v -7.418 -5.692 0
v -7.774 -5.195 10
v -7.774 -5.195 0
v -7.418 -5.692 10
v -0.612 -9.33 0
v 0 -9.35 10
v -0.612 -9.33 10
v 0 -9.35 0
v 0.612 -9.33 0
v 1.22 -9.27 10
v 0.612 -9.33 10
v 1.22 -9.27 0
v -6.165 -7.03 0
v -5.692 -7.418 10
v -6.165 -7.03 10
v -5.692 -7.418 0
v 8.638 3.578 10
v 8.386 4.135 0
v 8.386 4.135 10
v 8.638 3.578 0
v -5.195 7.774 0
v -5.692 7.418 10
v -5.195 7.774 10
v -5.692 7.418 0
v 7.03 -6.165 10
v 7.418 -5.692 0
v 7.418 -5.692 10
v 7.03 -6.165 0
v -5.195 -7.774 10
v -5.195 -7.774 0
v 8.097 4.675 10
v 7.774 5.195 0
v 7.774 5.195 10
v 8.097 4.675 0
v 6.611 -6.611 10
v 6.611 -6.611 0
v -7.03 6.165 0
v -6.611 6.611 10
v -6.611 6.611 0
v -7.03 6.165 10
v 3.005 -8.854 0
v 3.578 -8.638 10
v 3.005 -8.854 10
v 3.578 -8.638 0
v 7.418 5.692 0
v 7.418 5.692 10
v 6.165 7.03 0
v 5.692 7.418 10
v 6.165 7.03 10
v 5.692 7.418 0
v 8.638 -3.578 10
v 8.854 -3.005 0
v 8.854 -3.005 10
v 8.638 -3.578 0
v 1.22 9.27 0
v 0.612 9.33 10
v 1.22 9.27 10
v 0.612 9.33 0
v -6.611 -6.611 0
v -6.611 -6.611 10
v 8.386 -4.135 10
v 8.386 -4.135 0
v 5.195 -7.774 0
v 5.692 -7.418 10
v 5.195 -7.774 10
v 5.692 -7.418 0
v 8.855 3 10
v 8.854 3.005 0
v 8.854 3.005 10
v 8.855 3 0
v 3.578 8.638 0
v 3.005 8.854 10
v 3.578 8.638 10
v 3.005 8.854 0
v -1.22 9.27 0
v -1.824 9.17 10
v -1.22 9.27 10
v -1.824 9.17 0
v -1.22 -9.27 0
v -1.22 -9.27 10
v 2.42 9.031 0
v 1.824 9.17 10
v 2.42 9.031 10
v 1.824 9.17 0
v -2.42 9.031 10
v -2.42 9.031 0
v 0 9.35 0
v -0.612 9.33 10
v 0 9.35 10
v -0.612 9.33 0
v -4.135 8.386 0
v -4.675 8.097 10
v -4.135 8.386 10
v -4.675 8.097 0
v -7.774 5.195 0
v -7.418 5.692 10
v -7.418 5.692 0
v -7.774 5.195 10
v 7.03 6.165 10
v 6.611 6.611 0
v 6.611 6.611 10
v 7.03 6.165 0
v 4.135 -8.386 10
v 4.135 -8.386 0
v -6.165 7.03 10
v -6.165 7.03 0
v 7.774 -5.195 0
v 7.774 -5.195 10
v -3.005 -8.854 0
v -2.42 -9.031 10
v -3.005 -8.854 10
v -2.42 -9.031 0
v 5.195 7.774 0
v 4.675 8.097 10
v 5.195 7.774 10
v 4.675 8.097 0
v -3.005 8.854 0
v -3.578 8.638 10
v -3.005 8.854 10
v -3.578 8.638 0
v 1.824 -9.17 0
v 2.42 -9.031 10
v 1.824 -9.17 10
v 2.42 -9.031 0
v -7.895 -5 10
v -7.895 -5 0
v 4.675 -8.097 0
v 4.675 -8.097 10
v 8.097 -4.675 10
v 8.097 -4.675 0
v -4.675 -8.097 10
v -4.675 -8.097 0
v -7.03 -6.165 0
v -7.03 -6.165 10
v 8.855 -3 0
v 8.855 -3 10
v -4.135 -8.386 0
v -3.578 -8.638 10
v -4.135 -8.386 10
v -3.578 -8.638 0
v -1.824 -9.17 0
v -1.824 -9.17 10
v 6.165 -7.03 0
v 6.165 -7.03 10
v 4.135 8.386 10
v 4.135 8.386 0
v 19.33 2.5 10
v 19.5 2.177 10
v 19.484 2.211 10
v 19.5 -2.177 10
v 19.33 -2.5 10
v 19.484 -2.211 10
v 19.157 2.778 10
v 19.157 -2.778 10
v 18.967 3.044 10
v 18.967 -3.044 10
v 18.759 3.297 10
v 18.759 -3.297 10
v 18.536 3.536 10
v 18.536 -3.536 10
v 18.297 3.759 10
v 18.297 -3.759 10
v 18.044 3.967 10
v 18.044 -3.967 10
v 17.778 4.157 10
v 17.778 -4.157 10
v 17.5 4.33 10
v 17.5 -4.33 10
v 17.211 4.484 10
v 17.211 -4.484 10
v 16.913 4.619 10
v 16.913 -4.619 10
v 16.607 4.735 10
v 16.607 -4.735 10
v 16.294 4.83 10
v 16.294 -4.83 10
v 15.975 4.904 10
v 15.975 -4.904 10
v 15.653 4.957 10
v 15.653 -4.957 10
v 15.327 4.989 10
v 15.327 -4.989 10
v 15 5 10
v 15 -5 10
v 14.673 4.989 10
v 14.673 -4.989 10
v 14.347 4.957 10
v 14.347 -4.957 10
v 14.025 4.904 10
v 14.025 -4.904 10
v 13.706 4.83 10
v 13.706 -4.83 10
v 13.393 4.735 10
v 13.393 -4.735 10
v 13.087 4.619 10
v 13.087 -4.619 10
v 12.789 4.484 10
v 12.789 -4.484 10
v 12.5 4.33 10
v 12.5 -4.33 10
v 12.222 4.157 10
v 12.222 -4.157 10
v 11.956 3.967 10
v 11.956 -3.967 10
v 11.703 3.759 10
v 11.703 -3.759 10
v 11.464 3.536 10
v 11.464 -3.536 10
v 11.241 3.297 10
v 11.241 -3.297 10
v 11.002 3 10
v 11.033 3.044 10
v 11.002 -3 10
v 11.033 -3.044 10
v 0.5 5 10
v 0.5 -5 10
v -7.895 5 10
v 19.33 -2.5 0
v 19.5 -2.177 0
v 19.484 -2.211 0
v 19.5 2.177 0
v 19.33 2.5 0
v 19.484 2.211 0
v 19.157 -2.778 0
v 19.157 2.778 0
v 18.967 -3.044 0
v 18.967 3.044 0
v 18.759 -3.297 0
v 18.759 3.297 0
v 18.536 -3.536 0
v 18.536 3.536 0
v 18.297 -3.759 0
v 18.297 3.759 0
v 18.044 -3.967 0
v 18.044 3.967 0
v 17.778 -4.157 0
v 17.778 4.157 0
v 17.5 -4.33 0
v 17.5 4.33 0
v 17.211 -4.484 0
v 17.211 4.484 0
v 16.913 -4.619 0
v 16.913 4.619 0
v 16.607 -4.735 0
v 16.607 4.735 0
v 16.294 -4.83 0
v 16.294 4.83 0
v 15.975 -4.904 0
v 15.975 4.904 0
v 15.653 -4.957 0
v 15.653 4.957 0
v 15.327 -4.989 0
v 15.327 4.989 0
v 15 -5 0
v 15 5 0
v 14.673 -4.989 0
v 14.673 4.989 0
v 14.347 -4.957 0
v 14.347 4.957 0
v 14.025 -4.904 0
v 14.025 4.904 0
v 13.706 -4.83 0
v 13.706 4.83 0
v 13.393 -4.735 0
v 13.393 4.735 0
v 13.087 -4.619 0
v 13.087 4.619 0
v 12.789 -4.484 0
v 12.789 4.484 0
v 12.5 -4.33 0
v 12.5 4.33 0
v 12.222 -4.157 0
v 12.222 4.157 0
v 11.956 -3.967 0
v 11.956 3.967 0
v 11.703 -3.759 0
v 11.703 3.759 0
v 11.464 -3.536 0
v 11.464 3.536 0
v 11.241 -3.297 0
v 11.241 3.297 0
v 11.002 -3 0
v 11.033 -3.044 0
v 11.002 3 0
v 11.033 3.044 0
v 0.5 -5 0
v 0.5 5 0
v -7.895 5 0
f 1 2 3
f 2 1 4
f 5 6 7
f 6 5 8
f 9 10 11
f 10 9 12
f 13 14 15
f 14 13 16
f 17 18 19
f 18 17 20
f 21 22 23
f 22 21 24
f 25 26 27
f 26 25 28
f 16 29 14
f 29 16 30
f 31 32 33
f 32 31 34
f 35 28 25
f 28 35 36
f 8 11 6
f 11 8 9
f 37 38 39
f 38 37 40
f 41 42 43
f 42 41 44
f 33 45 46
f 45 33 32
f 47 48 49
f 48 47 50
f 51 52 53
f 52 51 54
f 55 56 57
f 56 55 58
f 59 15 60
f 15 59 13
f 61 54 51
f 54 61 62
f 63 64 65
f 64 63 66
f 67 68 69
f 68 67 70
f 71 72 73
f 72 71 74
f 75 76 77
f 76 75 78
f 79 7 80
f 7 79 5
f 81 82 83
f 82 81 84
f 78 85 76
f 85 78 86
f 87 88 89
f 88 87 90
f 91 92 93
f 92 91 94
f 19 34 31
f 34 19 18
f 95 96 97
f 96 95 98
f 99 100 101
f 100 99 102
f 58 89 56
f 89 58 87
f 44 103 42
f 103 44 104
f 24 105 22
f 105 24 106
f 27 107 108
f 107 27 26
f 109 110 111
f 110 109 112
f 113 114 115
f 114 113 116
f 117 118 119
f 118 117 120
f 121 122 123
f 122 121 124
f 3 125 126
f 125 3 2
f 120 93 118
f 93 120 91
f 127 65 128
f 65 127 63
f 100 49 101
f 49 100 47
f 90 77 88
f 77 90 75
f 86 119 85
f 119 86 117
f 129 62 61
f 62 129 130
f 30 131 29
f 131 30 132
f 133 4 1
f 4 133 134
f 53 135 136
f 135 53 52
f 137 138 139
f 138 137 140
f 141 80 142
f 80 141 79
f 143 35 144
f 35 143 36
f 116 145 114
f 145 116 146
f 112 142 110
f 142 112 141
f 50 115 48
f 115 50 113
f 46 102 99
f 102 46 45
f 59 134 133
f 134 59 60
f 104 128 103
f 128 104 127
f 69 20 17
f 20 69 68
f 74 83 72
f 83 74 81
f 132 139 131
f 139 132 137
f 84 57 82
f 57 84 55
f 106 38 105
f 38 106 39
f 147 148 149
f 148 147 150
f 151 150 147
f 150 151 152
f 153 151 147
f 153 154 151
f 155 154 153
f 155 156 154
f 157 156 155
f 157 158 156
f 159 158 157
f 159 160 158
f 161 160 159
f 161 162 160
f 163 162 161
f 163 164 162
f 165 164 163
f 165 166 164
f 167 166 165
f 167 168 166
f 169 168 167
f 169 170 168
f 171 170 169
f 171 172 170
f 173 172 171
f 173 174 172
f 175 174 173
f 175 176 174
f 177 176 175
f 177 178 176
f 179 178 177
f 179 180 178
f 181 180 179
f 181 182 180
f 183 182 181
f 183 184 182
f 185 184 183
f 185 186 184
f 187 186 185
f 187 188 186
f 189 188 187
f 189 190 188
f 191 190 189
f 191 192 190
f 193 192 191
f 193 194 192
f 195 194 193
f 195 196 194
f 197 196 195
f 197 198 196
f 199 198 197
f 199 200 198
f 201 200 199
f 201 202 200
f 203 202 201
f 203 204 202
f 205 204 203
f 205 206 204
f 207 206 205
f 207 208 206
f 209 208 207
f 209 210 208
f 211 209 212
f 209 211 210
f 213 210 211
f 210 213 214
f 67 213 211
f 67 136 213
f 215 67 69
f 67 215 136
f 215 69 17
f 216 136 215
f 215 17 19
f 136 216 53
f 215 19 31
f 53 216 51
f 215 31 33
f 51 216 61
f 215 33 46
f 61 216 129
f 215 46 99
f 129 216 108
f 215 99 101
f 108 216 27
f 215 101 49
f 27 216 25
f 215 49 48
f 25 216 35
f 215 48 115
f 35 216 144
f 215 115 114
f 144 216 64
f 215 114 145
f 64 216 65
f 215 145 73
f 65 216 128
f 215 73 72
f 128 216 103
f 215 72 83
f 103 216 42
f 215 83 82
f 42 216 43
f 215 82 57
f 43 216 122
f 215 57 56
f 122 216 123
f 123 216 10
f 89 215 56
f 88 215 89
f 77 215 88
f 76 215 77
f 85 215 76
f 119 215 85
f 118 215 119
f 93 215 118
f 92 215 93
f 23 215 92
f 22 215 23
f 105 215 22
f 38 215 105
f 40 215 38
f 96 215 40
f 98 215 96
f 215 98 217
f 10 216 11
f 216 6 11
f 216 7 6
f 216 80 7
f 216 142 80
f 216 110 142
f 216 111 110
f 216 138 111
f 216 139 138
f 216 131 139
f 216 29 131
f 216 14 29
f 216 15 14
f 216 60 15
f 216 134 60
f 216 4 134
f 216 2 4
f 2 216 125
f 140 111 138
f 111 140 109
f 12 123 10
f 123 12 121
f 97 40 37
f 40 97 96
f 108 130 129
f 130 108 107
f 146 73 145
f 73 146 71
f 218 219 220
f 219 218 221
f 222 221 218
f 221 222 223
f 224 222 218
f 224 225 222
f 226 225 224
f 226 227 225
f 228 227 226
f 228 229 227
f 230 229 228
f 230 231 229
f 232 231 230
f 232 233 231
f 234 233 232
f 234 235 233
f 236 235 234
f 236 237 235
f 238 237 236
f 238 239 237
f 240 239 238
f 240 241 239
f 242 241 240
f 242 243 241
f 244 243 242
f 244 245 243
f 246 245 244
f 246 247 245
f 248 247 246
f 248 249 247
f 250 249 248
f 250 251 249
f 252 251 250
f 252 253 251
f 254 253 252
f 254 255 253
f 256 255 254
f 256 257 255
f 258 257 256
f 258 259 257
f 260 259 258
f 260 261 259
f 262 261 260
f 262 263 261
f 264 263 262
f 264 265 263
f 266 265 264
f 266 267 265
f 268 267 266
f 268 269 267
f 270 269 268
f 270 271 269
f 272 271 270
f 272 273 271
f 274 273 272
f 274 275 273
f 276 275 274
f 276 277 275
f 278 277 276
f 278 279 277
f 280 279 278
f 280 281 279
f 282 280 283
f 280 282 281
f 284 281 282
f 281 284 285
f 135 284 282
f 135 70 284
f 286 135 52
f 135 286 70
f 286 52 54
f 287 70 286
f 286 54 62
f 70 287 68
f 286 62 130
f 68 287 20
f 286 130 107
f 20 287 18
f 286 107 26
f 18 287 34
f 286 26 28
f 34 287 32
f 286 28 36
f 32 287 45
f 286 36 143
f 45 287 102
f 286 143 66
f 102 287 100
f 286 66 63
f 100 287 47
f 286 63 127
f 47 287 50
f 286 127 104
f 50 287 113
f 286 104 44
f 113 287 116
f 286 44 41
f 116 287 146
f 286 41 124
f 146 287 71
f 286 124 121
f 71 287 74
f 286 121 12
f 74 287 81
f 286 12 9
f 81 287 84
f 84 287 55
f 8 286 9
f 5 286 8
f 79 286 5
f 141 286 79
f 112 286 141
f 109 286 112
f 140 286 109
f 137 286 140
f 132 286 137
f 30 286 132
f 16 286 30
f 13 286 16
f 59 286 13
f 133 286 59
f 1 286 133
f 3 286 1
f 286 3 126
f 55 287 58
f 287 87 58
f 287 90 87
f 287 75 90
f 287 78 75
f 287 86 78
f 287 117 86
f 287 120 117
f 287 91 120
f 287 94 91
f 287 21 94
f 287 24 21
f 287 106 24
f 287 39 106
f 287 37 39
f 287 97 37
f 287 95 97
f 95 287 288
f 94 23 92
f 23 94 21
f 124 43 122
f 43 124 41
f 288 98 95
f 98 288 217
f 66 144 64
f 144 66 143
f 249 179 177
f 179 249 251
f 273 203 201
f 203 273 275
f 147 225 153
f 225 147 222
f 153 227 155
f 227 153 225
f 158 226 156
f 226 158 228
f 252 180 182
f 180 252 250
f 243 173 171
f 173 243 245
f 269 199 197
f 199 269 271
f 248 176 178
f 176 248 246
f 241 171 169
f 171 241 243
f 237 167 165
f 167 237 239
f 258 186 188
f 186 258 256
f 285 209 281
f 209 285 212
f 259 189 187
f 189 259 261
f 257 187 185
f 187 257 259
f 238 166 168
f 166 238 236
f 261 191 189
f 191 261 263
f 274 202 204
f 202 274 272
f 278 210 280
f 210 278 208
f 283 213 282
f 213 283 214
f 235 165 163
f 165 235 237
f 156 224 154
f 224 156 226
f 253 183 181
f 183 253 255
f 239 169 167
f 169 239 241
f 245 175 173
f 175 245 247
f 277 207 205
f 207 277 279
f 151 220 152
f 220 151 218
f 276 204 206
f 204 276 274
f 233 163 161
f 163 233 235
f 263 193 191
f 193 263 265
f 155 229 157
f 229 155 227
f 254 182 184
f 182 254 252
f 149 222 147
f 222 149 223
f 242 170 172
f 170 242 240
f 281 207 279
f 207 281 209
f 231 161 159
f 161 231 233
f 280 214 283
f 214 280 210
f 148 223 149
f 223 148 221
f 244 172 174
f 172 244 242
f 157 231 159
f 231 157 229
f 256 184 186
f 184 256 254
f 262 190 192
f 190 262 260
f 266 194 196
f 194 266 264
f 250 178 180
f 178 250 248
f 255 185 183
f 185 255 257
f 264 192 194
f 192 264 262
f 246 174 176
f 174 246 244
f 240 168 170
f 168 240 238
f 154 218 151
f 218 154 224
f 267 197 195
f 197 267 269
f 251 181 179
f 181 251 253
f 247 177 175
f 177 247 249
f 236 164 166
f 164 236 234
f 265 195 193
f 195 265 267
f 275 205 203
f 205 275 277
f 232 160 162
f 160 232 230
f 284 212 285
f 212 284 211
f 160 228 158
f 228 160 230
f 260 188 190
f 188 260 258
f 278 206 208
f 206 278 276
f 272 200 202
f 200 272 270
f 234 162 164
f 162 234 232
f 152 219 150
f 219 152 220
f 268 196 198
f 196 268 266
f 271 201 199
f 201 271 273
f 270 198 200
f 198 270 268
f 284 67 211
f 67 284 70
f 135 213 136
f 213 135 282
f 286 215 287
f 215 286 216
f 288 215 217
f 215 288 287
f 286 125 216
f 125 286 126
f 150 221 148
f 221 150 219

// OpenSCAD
// Tubing clip for 12.7 mm stand rod
// Print orientation: flat on bed, extrusion along +Z

// ---- Stand rod ring ----
stand_id   = 12.7;   // stand rod inner diameter
stand_wall = 3;      // stand ring wall thickness
stand_od   = stand_id + 2 * stand_wall;  // 18.7 mm outer diameter

// ---- Tubing ring ----
tube_id    = 6;      // tubing inner diameter
tube_wall  = 2;      // tubing wall thickness
tube_od    = tube_id + 2 * tube_wall;    // 10 mm outer diameter

// ---- Bridge ----
bridge_w   = 6;      // bridge width in Y
bridge_x0  = 8;      // bridge start (X)
bridge_x1  = 12;     // bridge end (X)

// ---- Misc ----
eps        = 0.5;    // cutter overshoot past faces
$fn        = 96;     // curve resolution

difference() {
    union() {
        // Stand rod ring
        cylinder(d = stand_od, h = 10);
        // Tubing ring
        translate([15, 0, 0])
            cylinder(d = tube_od, h = 10);
        // Solid bridge
        translate([bridge_x0, -bridge_w / 2, 0])
            cube([bridge_x1 - bridge_x0, bridge_w, 10]);
    }
    // Stand rod opening (x < 0, -5 < y < 5)
    translate([-stand_od / 2 - eps, -5, 0])
        cube([stand_od / 2 + 2 * eps, 10, 10]);
    // Tubing opening (x > 15, -2.25 < y < 2.25)
    translate([15 + tube_od / 2 - eps, -2.25, 0])
        cube([tube_od / 2 + 2 * eps, 4.5, 10]);
}
